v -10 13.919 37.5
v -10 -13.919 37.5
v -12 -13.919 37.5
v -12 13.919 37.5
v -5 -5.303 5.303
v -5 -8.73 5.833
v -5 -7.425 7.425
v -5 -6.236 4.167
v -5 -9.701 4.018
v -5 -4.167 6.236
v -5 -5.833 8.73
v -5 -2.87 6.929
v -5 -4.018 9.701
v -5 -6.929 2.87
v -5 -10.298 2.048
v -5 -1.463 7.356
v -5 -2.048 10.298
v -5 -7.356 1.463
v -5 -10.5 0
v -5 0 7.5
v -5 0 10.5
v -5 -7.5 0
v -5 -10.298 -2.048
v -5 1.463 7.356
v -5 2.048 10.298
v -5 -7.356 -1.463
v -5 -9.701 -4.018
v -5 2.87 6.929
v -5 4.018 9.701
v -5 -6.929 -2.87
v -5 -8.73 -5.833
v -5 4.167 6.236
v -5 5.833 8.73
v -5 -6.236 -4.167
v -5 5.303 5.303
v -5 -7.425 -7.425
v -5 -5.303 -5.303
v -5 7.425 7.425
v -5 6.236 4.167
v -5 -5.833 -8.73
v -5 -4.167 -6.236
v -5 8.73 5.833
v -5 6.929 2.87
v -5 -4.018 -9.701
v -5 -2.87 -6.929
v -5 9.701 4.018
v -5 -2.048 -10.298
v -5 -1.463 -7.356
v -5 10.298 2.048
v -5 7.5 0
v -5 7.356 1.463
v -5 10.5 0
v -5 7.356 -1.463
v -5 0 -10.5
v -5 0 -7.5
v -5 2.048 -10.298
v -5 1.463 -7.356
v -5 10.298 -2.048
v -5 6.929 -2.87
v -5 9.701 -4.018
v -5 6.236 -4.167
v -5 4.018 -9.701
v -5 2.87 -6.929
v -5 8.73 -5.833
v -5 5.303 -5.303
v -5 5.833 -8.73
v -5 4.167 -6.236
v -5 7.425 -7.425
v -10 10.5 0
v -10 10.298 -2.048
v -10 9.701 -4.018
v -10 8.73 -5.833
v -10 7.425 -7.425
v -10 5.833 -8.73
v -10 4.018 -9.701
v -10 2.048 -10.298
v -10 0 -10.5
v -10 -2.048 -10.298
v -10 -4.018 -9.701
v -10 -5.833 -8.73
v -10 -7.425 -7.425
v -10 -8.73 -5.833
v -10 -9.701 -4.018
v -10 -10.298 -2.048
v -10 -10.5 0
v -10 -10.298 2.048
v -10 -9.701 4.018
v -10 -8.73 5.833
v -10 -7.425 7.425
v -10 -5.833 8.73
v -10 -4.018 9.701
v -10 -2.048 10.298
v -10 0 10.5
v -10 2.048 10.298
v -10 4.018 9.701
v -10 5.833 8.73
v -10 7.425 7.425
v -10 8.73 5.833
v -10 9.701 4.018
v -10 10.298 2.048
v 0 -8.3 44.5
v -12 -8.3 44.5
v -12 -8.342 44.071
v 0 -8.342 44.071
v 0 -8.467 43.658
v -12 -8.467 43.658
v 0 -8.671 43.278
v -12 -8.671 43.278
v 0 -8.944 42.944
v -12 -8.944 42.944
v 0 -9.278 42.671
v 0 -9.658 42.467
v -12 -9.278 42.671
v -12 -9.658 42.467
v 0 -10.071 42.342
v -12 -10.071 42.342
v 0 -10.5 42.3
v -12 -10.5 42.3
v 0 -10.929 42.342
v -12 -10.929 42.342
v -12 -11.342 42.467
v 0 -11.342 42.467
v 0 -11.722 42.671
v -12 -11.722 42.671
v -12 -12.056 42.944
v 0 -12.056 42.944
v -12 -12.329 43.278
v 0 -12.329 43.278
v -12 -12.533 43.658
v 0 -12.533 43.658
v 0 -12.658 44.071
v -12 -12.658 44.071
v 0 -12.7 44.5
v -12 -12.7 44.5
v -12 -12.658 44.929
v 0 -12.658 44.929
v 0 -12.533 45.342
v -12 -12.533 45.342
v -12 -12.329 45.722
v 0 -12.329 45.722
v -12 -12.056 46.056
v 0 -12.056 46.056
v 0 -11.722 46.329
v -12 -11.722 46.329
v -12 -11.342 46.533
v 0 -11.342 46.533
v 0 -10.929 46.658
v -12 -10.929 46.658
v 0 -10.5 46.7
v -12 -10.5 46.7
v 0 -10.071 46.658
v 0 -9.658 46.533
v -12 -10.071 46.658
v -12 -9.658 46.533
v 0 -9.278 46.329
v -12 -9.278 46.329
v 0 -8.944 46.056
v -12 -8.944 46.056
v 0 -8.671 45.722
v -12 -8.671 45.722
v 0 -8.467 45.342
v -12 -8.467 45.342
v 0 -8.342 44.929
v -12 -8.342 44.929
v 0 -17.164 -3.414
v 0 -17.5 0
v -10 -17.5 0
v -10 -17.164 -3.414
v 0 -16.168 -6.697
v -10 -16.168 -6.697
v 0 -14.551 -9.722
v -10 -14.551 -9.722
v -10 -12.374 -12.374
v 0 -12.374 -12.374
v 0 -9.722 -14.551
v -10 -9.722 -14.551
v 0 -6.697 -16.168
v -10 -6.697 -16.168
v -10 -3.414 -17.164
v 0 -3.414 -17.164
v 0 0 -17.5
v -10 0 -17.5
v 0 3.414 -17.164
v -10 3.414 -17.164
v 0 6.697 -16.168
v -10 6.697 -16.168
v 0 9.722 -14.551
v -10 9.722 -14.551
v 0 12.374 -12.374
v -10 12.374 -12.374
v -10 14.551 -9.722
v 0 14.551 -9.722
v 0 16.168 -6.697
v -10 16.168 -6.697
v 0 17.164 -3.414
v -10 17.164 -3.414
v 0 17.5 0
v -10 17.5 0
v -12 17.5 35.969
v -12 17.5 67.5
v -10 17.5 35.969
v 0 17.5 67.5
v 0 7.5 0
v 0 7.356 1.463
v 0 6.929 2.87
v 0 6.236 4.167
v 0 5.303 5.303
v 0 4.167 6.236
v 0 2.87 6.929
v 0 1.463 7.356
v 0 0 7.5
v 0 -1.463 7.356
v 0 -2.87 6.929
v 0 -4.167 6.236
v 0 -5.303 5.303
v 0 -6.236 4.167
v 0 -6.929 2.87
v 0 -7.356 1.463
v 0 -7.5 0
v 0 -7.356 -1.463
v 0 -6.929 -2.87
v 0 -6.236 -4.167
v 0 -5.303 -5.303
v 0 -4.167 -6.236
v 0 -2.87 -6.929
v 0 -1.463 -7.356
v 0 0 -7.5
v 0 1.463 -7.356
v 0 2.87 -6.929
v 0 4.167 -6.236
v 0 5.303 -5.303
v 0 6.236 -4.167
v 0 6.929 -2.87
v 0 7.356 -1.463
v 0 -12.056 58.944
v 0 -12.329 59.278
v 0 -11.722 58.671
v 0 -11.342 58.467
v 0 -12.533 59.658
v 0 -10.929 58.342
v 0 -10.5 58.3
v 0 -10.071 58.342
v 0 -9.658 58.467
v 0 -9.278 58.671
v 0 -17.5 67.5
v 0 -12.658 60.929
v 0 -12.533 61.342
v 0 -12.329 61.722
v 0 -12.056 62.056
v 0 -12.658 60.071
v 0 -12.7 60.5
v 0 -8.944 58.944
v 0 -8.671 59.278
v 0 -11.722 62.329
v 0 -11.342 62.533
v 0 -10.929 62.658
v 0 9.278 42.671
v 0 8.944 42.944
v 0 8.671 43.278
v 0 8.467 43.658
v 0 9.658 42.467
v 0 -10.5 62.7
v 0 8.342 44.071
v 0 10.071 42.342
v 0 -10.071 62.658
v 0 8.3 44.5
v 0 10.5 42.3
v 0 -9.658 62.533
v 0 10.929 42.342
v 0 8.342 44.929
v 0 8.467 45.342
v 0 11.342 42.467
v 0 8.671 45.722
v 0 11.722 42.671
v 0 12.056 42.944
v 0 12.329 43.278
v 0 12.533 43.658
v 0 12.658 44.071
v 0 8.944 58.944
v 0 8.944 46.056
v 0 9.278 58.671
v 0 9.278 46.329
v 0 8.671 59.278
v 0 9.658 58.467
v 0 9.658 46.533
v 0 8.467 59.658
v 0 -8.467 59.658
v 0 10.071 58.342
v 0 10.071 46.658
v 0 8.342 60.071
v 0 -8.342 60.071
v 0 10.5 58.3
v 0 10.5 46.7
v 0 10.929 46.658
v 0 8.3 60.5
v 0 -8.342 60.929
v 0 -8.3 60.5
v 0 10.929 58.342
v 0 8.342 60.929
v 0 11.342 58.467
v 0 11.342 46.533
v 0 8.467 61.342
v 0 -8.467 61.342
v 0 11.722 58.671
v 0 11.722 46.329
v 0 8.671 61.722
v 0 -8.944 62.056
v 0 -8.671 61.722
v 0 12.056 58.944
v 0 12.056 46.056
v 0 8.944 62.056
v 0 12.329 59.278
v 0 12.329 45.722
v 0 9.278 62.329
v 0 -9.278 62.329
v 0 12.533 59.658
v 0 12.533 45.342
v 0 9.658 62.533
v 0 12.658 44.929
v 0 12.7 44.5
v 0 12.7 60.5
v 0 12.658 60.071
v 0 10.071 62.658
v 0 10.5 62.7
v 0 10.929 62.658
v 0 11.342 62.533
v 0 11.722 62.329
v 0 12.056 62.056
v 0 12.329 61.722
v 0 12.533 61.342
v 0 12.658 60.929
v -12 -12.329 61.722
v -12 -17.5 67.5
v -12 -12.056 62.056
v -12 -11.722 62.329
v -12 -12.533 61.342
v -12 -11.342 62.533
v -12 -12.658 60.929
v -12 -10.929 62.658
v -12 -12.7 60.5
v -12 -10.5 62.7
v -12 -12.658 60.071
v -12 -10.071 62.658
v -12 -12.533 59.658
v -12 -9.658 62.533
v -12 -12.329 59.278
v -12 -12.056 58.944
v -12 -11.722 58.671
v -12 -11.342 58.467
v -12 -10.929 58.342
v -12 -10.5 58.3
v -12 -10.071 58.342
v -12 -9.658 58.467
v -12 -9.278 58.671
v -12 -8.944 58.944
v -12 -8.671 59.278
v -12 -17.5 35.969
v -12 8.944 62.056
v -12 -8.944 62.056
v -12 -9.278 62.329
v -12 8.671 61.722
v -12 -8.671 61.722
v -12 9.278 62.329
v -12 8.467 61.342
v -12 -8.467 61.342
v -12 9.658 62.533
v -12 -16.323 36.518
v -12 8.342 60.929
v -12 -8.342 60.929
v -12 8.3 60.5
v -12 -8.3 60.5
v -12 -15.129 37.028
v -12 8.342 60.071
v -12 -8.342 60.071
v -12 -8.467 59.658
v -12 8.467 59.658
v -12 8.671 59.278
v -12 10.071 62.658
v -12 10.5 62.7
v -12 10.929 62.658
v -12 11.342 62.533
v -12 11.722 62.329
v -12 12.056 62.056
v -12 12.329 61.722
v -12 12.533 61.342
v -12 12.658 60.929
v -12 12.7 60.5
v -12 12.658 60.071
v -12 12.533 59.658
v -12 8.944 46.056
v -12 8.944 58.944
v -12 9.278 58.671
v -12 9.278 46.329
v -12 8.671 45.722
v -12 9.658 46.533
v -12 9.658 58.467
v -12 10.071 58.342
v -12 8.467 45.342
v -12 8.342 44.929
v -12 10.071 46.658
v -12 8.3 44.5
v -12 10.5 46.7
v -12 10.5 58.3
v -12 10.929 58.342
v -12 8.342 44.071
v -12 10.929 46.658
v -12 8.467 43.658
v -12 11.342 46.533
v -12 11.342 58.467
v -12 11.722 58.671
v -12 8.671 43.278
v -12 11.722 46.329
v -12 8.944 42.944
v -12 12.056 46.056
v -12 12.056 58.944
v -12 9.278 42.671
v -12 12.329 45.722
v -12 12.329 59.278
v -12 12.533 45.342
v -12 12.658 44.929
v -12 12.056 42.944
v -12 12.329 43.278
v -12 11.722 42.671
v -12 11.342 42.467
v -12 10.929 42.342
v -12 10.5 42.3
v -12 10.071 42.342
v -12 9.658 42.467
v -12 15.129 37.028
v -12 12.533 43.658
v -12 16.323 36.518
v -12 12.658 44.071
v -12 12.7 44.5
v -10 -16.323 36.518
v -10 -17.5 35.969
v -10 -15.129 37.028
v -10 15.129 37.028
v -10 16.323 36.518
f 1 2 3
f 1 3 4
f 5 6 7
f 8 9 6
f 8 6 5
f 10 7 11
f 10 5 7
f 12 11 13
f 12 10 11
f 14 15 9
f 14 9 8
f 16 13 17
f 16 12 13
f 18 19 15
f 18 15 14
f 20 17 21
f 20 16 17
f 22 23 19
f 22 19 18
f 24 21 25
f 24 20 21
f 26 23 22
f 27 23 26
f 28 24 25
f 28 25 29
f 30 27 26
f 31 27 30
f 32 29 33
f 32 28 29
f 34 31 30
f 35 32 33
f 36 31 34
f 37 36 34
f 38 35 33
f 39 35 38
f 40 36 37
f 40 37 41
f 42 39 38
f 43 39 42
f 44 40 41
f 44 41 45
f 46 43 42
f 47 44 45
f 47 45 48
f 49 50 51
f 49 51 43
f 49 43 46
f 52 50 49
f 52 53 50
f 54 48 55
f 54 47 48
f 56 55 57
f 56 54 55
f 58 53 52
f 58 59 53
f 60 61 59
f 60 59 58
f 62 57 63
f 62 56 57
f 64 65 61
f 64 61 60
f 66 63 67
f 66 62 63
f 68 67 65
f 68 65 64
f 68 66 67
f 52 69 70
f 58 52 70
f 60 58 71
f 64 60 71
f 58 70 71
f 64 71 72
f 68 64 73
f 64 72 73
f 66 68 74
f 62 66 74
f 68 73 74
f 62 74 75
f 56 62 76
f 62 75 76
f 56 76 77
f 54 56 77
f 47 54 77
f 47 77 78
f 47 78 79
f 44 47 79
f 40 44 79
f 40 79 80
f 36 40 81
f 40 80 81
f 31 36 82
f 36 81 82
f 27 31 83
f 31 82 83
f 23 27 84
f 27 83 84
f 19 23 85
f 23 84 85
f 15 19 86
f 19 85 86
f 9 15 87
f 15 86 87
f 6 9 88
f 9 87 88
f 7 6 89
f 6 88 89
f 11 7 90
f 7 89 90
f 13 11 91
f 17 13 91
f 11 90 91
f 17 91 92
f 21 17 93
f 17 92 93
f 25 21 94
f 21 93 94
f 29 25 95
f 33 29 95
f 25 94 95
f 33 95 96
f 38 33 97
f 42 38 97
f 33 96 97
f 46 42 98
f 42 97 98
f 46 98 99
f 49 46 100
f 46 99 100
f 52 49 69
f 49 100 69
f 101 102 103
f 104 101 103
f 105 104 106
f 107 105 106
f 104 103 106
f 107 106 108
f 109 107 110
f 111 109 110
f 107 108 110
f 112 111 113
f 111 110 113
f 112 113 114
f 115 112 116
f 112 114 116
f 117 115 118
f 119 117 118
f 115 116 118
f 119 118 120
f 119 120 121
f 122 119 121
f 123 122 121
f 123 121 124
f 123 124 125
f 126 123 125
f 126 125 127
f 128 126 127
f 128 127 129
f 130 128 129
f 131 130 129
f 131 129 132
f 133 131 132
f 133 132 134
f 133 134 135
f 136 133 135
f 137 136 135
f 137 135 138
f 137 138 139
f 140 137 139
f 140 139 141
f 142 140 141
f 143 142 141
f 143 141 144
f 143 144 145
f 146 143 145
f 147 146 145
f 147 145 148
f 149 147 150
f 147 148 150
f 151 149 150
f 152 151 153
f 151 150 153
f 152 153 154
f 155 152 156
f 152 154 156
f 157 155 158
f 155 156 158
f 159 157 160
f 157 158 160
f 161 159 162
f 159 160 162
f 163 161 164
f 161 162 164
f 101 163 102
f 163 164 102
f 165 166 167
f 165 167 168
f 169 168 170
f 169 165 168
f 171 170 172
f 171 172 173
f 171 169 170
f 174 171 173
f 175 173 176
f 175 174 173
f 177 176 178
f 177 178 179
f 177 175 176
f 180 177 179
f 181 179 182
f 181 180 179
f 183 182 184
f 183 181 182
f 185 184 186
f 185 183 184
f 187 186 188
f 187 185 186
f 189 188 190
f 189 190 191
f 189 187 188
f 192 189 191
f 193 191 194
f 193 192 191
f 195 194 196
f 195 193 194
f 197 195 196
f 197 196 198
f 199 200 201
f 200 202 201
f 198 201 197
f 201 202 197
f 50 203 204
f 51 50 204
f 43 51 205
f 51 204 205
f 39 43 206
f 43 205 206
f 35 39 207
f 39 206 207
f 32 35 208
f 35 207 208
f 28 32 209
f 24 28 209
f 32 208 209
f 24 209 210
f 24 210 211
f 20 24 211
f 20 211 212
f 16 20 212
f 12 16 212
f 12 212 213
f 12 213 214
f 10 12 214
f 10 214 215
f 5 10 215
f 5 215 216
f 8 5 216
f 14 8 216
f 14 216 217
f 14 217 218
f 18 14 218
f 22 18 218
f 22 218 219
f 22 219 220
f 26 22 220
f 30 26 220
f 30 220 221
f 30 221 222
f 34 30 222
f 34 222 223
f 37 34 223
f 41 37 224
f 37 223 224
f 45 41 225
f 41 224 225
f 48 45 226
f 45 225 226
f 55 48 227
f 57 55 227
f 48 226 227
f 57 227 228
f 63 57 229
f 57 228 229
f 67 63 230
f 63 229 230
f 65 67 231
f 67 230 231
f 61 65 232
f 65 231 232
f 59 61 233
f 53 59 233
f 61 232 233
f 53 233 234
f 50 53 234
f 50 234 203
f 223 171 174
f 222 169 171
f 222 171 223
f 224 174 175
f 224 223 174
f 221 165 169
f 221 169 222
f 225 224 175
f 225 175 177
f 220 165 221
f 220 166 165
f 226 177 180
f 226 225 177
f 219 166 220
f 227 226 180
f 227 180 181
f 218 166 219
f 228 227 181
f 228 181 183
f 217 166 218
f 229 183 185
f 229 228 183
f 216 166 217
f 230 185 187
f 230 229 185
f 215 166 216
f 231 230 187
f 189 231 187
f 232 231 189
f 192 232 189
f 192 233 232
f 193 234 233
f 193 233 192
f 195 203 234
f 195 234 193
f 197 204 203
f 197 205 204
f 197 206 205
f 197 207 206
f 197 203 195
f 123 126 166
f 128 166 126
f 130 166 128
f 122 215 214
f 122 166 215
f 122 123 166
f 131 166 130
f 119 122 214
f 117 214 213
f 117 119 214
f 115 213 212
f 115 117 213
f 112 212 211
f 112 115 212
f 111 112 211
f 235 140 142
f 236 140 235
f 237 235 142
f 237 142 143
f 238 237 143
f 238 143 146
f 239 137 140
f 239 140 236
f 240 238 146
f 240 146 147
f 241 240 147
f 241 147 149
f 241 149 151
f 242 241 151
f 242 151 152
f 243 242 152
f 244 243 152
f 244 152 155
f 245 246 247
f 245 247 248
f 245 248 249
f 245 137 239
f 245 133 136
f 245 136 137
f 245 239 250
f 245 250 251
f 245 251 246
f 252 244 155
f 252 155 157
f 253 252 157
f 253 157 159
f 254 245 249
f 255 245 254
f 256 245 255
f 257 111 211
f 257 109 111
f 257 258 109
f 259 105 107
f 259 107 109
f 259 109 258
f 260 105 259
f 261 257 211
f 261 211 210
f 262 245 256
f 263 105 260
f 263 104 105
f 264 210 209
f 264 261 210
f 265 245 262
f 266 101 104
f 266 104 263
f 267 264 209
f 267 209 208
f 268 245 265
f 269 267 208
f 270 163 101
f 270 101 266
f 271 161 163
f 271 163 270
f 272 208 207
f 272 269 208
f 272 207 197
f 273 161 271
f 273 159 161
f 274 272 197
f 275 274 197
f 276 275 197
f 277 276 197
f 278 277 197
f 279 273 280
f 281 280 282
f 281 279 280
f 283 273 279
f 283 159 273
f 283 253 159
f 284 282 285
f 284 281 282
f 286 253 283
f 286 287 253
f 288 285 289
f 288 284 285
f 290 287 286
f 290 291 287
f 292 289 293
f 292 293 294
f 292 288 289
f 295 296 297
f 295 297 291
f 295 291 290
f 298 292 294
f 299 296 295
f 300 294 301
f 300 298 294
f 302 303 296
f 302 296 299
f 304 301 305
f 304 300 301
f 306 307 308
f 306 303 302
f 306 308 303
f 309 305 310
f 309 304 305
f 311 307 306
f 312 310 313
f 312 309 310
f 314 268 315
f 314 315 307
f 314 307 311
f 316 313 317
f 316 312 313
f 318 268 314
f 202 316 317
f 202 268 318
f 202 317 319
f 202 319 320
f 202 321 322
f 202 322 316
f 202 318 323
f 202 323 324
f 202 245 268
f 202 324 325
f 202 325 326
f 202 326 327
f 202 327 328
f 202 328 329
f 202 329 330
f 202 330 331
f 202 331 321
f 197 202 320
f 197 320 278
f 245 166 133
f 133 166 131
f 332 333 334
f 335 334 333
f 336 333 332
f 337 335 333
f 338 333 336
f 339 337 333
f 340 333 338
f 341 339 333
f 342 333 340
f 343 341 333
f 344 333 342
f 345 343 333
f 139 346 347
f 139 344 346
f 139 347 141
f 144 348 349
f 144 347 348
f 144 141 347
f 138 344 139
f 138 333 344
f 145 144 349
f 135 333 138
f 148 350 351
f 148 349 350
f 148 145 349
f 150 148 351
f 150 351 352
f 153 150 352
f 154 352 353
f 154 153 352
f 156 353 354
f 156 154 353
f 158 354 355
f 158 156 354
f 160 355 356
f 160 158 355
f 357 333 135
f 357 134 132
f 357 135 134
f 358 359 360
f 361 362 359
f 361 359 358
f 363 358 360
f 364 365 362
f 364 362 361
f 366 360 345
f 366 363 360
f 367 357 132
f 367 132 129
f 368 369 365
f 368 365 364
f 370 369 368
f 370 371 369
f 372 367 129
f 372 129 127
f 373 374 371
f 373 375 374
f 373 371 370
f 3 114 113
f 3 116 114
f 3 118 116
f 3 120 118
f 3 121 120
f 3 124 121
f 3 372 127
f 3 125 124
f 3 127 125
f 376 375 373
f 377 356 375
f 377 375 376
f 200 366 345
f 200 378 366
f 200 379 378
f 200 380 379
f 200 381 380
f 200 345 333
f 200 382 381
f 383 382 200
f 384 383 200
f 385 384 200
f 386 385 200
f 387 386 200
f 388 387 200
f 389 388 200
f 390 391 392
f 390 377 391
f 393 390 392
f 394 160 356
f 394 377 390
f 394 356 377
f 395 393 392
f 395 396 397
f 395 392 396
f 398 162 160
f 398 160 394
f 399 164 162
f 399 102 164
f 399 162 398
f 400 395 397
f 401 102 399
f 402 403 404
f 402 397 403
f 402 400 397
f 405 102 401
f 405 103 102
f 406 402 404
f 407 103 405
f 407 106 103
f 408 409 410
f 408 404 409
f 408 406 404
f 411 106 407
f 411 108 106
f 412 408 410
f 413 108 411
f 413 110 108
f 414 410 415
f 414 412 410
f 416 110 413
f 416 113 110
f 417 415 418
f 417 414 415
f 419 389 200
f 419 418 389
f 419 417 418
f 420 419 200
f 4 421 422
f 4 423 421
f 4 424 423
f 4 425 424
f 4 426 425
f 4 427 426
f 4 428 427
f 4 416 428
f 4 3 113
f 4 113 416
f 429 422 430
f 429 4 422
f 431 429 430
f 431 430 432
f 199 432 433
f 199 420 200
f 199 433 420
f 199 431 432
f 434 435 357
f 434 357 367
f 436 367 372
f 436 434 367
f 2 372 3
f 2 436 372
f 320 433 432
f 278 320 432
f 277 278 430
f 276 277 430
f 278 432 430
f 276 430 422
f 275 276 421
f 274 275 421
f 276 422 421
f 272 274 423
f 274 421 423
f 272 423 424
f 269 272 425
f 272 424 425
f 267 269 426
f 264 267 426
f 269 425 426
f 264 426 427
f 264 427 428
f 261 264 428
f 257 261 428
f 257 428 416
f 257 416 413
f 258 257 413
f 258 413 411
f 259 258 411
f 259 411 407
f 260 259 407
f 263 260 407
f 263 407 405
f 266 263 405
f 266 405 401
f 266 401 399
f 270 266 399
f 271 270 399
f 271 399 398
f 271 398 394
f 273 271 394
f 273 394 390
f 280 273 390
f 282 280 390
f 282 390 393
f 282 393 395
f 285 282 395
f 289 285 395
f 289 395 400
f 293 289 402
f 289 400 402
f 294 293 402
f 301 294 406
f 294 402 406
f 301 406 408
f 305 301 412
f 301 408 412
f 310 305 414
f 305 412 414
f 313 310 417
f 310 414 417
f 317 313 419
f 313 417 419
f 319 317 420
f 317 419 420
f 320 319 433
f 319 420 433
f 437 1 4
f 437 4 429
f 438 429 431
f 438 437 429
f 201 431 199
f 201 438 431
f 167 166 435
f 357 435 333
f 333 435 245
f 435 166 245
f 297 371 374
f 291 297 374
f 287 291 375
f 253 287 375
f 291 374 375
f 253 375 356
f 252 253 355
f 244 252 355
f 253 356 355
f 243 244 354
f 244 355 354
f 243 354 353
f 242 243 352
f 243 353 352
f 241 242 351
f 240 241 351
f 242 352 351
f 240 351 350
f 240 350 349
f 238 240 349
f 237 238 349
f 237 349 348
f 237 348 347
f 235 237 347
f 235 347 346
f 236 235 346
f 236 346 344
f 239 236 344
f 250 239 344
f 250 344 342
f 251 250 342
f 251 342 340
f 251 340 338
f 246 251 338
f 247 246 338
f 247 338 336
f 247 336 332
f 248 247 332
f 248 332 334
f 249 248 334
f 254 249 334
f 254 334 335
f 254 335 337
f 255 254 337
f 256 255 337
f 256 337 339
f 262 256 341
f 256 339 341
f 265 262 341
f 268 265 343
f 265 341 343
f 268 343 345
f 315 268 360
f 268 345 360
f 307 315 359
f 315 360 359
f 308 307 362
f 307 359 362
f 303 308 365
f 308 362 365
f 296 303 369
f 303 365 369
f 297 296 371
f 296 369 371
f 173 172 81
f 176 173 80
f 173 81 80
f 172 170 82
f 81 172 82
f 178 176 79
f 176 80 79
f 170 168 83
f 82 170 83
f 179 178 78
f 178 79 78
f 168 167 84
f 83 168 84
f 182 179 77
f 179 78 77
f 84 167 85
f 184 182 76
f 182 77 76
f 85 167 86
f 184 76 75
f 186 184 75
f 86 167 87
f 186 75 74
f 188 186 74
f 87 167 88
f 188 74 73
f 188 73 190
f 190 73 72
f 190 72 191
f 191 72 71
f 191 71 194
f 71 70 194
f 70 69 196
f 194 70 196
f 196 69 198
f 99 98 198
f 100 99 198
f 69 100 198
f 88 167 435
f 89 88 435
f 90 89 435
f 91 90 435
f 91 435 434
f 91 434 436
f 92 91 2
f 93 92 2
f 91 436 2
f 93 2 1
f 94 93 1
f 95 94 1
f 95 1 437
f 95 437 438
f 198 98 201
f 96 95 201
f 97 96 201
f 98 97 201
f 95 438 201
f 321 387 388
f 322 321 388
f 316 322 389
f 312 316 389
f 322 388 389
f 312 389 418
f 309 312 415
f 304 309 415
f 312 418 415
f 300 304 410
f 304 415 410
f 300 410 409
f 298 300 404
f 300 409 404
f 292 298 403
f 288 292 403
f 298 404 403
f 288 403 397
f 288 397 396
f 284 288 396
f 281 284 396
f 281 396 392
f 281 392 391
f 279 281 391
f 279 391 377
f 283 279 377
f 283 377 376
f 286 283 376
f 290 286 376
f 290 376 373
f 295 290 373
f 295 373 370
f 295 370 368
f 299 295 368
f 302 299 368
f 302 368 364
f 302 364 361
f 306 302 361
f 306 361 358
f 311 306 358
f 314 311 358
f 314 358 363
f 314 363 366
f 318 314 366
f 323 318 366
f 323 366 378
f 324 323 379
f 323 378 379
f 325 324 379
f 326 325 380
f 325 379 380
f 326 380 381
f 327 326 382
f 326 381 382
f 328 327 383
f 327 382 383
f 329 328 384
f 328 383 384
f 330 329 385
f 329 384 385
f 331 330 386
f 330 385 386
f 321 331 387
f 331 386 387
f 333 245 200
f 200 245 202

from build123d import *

# Parameters (mm, degrees)
PAD_DEPTH     = 10
SKETCH001_R   = 7.5
HOLE_DEPTH    = 10.001
SKETCH003_R   = 10.5
HOLE002_DEPTH = 5
PAD001_DEPTH  = 2
SKETCH005_R   = 2.2
HOLE003_DEPTH = 12.001


with BuildPart() as part:
    # Sketch → Pad (new body)
    with BuildSketch(Plane.YZ):
        with BuildLine():
            ThreePointArc((-17.5, 0), (1.8e-05, -17.5), (17.5, 3.6e-05))
            Line((17.5, 3.6e-05), (17.5, 67.5))
            Line((-17.5, 67.5), (17.5, 67.5))
            Line((-17.5, 0), (-17.5, 67.5))
        make_face()
    extrude(amount=-PAD_DEPTH)

    # Sketch001 (on Face5 of Pad) → Hole (cut, through all)
    with BuildSketch(Plane.YZ):
        Circle(SKETCH001_R)
    extrude(amount=-HOLE_DEPTH, mode=Mode.SUBTRACT)

    # Sketch003 → Hole002 (cut)
    with BuildSketch(Plane(origin=(-10, 0, 0), x_dir=(0, 1, 0), z_dir=(-1, 0, 0))):
        Circle(SKETCH003_R)
    extrude(amount=-HOLE002_DEPTH, mode=Mode.SUBTRACT)

    # Sketch004 (on Face6 of Pad) → Pad001 (join)
    with BuildSketch(Plane(origin=(-10, 0, 0), x_dir=(0, 1, 0), z_dir=(-1, 0, 0))):
        with BuildLine():
            Line((-17.5, -35.968736), (-17.5, -67.5))
            Line((-17.5, -67.5), (17.5, -67.5))
            Line((17.5, -67.5), (17.5, -35.968736))
            ThreePointArc((13.919411, -37.5), (15.728351, -36.777968), (17.5, -35.968736))
            Line((-13.919411, -37.5), (13.919411, -37.5))
            ThreePointArc((-17.5, -35.968736), (-15.728351, -36.777968), (-13.919411, -37.5))
        make_face()
    extrude(amount=PAD001_DEPTH)

    # Sketch005 (on Face15 of Pad001) → Hole003 (cut, through all)
    with BuildSketch(Plane(origin=(-12, 0, 0), x_dir=(0, 1, 0), z_dir=(-1, 0, 0))):
        with Locations((-10.5, -44.5)):
            Circle(SKETCH005_R)
        with Locations((-10.5, -60.5)):
            Circle(SKETCH005_R)
        with Locations((10.5, -44.5)):
            Circle(SKETCH005_R)
        with Locations((10.5, -60.5)):
            Circle(SKETCH005_R)
    extrude(amount=-HOLE003_DEPTH, mode=Mode.SUBTRACT)


solid = part.part
